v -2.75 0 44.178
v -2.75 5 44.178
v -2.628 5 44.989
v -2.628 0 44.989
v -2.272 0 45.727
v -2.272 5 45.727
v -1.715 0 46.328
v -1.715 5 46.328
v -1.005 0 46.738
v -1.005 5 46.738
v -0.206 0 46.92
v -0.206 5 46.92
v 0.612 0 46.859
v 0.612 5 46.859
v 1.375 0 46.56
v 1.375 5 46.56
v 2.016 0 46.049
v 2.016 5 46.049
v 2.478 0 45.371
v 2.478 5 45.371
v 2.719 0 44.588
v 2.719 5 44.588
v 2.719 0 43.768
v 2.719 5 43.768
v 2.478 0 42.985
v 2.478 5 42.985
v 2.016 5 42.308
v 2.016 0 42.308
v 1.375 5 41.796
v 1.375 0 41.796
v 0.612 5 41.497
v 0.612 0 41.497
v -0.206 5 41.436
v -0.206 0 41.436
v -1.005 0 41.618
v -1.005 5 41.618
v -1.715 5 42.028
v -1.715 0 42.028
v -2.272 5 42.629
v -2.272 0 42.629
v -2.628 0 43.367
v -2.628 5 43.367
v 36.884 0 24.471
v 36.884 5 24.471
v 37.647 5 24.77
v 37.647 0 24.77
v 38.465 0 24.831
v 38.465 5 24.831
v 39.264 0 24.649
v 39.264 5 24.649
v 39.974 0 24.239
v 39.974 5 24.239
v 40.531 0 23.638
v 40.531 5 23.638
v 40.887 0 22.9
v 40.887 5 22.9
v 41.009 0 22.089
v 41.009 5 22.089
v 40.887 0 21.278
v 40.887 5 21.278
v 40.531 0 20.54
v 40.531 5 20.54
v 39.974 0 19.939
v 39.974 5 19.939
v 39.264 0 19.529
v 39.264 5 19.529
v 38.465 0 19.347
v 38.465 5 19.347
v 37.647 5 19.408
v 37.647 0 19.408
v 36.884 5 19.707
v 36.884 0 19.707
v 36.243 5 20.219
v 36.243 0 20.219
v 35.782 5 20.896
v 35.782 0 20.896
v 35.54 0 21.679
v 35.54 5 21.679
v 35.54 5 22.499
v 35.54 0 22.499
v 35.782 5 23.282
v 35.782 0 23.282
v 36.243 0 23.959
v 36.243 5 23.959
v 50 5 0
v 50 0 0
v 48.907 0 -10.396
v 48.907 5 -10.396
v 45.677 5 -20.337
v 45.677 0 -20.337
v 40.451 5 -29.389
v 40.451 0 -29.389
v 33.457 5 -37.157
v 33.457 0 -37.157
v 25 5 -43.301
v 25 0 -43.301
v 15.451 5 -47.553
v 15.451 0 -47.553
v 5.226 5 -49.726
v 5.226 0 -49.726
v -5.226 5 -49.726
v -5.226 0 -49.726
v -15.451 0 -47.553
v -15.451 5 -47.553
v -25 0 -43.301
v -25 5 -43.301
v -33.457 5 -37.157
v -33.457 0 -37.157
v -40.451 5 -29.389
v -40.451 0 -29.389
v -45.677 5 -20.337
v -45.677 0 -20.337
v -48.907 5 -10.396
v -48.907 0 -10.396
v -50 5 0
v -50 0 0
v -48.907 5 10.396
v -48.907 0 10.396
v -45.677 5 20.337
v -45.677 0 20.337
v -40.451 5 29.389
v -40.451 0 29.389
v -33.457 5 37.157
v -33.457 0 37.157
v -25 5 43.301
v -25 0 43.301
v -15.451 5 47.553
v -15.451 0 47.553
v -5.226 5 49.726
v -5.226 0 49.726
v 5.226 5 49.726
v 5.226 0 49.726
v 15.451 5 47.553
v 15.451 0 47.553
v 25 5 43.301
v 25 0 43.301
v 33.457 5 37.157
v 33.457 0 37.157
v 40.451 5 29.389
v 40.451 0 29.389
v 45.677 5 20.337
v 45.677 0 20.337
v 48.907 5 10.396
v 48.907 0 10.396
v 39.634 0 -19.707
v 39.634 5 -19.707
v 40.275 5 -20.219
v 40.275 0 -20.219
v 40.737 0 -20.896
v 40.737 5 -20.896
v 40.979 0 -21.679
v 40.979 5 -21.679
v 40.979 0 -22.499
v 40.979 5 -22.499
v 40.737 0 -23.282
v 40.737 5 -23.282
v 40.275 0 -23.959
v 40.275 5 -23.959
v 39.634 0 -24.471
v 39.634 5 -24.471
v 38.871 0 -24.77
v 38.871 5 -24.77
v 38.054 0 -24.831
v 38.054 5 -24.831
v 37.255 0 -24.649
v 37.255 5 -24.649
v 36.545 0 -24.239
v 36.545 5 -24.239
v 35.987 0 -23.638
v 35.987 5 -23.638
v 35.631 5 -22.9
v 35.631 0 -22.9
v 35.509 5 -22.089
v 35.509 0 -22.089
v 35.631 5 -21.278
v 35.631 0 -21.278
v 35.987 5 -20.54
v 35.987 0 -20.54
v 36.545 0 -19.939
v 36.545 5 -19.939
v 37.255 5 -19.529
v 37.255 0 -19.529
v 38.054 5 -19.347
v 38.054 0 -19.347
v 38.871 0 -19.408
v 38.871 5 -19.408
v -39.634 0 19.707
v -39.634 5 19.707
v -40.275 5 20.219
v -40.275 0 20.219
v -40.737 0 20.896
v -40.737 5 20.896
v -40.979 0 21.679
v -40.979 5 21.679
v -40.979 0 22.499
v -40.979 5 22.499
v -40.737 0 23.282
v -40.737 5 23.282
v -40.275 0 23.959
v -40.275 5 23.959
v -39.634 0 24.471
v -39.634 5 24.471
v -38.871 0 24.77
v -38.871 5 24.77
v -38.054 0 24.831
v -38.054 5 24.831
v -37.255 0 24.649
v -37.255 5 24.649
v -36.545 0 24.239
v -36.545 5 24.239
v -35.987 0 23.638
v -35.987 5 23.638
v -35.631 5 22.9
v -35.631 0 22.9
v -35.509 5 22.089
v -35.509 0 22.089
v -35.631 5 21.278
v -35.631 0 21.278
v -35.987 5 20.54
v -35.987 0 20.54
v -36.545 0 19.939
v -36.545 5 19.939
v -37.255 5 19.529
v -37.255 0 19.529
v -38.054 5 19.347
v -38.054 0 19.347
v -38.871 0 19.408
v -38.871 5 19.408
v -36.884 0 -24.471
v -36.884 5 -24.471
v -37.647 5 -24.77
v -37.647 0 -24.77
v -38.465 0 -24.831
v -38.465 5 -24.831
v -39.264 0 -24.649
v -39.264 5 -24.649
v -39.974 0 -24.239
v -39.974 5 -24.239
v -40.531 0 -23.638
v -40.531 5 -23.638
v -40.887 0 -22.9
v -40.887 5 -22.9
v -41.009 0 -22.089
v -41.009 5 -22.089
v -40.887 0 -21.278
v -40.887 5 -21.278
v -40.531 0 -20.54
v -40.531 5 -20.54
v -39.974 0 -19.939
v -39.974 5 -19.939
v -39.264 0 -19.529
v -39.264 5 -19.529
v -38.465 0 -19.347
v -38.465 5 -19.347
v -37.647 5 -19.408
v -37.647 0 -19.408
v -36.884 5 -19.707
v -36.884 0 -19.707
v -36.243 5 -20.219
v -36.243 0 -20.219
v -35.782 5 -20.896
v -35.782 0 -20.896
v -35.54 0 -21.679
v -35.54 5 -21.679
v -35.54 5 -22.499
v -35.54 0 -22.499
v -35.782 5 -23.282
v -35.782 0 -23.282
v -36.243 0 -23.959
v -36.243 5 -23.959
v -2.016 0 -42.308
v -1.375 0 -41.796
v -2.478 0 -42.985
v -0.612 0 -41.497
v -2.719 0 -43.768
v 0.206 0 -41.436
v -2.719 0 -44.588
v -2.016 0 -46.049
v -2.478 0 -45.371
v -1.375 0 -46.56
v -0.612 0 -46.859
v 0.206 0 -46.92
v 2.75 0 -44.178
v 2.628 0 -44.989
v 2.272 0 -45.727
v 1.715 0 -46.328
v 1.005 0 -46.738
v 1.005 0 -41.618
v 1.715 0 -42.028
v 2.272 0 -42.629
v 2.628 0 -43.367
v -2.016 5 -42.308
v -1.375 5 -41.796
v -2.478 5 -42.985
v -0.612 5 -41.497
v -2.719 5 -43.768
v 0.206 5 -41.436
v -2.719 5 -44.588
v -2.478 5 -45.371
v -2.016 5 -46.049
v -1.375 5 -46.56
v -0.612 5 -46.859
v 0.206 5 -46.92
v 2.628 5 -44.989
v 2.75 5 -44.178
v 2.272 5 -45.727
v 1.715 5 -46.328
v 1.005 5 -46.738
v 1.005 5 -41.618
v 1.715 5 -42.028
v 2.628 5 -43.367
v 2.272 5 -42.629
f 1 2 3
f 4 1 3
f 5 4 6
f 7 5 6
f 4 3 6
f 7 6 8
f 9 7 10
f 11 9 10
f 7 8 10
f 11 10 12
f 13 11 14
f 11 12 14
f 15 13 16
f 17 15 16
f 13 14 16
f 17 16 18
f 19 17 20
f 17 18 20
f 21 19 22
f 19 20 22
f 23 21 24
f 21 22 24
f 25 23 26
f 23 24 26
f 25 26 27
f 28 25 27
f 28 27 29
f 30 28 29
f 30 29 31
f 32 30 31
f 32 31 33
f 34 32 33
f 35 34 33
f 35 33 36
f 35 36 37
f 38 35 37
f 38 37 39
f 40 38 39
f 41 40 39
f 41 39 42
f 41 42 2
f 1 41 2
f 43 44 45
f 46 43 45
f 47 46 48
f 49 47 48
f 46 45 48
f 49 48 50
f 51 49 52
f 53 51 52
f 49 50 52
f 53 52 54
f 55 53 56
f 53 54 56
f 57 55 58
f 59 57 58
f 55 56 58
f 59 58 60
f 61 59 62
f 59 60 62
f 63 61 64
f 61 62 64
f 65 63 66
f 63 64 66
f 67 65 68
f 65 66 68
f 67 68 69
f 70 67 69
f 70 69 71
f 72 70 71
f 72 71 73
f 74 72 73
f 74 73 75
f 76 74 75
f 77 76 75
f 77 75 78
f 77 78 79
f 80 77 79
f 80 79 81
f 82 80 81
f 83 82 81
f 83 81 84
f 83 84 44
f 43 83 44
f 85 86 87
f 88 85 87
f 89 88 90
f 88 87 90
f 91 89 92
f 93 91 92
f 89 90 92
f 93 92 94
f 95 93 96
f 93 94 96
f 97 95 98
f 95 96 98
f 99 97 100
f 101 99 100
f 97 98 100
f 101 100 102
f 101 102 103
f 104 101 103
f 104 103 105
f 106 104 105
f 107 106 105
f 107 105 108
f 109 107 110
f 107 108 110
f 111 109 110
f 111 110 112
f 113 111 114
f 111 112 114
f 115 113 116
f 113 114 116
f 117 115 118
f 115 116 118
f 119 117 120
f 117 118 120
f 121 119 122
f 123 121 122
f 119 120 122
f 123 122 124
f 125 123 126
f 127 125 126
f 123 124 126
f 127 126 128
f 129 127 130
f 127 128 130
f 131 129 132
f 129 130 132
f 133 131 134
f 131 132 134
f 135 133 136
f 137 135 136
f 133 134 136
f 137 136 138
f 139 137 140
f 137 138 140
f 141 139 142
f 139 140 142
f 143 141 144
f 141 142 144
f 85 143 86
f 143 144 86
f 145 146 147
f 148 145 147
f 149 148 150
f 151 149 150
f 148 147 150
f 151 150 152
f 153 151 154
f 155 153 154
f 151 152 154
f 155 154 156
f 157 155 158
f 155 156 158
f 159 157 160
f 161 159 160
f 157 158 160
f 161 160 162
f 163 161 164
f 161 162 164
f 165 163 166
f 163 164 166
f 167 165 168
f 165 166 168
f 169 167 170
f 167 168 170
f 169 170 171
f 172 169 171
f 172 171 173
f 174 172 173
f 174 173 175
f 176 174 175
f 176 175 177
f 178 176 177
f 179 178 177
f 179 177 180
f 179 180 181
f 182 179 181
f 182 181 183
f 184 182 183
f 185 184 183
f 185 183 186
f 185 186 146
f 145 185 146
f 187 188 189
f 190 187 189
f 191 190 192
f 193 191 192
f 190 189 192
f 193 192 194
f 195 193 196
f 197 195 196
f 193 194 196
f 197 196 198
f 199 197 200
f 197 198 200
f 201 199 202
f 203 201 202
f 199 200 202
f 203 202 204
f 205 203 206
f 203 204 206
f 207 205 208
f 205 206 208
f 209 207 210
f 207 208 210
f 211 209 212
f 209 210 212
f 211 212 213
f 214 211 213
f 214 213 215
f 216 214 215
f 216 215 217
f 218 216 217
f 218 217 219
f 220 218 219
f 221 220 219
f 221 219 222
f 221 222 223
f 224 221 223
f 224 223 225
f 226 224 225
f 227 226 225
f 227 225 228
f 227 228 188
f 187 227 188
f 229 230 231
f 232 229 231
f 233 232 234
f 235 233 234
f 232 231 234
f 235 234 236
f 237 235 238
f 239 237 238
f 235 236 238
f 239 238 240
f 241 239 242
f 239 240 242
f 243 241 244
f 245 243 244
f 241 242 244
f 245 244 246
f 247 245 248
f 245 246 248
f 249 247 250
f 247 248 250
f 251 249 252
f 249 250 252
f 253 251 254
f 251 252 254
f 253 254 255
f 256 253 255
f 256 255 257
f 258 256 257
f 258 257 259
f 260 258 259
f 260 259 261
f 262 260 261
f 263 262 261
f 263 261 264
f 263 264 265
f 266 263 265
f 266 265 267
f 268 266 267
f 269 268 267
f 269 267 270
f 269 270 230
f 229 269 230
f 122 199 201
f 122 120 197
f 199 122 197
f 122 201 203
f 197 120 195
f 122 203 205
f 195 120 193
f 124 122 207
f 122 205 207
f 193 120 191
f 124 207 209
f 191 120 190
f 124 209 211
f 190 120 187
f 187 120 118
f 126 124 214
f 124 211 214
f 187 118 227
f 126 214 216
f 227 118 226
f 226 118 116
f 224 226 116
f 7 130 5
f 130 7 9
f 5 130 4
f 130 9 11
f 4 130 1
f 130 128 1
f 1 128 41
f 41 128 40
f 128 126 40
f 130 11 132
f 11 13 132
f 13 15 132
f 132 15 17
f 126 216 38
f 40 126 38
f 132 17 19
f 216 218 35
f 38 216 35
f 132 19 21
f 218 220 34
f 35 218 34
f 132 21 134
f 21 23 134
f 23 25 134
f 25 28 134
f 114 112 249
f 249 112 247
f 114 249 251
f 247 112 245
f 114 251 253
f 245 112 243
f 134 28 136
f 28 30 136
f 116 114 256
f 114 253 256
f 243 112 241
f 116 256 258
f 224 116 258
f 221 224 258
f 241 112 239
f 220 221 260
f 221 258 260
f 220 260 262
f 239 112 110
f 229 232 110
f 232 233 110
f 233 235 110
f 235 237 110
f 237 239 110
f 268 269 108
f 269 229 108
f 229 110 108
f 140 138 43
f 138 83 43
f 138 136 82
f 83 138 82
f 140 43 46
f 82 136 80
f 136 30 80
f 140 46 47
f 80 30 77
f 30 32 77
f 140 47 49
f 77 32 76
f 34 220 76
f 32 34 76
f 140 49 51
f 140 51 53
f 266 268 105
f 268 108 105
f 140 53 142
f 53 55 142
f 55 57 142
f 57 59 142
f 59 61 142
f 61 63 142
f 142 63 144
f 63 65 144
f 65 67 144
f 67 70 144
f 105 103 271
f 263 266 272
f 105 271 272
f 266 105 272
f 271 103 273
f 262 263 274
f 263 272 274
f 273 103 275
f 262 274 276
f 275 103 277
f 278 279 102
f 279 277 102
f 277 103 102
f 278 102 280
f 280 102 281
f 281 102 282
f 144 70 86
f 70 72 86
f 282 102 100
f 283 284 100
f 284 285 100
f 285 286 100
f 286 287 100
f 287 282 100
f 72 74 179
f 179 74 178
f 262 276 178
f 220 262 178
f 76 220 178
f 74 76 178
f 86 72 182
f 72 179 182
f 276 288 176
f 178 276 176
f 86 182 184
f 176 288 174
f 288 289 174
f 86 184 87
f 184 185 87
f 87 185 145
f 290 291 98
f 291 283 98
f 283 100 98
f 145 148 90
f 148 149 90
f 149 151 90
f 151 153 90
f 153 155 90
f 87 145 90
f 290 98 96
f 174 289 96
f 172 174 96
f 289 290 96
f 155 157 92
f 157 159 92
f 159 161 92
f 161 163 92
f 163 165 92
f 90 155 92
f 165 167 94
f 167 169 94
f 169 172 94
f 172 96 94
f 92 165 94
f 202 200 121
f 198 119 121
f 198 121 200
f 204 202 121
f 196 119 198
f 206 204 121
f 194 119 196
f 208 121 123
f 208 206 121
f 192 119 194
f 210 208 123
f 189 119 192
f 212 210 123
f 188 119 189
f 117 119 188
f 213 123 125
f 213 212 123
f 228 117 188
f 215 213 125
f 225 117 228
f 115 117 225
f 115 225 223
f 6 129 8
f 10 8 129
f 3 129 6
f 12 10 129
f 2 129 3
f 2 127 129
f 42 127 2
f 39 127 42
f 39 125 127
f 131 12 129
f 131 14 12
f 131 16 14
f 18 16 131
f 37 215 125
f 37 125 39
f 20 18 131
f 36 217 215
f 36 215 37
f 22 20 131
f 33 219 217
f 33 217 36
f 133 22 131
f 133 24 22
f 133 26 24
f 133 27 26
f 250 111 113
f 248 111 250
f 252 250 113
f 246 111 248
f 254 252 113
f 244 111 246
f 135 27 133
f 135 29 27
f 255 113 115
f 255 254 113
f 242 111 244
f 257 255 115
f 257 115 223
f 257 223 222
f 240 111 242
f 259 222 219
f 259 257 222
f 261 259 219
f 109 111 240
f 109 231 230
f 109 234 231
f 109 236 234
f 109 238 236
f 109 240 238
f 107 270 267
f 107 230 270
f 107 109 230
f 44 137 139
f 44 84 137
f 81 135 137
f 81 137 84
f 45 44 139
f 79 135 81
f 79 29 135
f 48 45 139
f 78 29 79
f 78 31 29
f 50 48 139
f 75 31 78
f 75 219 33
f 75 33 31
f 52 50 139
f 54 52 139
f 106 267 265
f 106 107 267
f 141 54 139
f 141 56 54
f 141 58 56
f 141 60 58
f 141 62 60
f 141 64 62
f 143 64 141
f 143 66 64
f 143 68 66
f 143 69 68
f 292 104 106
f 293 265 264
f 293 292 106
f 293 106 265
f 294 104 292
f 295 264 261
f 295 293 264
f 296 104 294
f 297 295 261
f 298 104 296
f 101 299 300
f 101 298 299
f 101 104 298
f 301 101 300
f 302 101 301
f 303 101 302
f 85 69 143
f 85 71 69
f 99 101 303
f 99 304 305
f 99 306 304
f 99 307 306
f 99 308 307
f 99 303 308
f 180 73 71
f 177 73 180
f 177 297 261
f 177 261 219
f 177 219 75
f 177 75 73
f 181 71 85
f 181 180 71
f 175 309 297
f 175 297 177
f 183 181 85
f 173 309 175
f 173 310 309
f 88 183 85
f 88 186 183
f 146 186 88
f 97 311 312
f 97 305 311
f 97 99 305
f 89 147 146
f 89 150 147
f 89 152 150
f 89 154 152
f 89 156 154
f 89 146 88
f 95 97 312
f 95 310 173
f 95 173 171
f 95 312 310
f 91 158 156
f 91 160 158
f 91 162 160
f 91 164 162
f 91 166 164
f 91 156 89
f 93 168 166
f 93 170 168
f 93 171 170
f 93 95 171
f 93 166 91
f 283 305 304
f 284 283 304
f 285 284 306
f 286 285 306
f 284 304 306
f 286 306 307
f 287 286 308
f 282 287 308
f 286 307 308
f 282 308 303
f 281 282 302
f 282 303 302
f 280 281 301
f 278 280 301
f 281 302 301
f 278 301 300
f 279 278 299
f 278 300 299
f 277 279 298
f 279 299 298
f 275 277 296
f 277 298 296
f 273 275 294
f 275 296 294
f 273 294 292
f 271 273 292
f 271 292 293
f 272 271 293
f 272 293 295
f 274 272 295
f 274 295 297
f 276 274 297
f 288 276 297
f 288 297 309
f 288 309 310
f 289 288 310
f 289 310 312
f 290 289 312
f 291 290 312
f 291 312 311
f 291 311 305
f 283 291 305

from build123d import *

# Parameters (mm, degrees)
CROQUIS1_R                   = 50
SALIENTE_EXTRUIR1_DEPTH      = 5
TALADRO_DE_MARGEN_PARA_M51_D = 5.5
MATRIZC1_COUNT               = 6


with BuildPart() as part:
    # Croquis1 → Saliente-Extruir1 (new body)
    with BuildSketch(Plane(origin=(0, 0, 0), x_dir=(1, 0, 0), z_dir=(0, 1, 0))):
        Circle(CROQUIS1_R)
    extrude(amount=SALIENTE_EXTRUIR1_DEPTH)

    # Taladro de margen para M51 (through all)
    with Locations(Plane(origin=(0, 0, 0), x_dir=(-1, 0, 0), z_dir=(0, -1, 0))):
        with Locations((0, 44.178034415)):
            taladro_de_margen_para_m51 = Hole(TALADRO_DE_MARGEN_PARA_M51_D / 2)

    # MatrizC1: Taladro de margen para M51 ×6 about axis
    matrizc1_axis = Axis((0, 0, 0), (0, 1, 0))
    for i in range(1, MATRIZC1_COUNT):
        add(taladro_de_margen_para_m51.rotate(matrizc1_axis, i * 360 / MATRIZC1_COUNT), mode=Mode.SUBTRACT)


solid = part.part
